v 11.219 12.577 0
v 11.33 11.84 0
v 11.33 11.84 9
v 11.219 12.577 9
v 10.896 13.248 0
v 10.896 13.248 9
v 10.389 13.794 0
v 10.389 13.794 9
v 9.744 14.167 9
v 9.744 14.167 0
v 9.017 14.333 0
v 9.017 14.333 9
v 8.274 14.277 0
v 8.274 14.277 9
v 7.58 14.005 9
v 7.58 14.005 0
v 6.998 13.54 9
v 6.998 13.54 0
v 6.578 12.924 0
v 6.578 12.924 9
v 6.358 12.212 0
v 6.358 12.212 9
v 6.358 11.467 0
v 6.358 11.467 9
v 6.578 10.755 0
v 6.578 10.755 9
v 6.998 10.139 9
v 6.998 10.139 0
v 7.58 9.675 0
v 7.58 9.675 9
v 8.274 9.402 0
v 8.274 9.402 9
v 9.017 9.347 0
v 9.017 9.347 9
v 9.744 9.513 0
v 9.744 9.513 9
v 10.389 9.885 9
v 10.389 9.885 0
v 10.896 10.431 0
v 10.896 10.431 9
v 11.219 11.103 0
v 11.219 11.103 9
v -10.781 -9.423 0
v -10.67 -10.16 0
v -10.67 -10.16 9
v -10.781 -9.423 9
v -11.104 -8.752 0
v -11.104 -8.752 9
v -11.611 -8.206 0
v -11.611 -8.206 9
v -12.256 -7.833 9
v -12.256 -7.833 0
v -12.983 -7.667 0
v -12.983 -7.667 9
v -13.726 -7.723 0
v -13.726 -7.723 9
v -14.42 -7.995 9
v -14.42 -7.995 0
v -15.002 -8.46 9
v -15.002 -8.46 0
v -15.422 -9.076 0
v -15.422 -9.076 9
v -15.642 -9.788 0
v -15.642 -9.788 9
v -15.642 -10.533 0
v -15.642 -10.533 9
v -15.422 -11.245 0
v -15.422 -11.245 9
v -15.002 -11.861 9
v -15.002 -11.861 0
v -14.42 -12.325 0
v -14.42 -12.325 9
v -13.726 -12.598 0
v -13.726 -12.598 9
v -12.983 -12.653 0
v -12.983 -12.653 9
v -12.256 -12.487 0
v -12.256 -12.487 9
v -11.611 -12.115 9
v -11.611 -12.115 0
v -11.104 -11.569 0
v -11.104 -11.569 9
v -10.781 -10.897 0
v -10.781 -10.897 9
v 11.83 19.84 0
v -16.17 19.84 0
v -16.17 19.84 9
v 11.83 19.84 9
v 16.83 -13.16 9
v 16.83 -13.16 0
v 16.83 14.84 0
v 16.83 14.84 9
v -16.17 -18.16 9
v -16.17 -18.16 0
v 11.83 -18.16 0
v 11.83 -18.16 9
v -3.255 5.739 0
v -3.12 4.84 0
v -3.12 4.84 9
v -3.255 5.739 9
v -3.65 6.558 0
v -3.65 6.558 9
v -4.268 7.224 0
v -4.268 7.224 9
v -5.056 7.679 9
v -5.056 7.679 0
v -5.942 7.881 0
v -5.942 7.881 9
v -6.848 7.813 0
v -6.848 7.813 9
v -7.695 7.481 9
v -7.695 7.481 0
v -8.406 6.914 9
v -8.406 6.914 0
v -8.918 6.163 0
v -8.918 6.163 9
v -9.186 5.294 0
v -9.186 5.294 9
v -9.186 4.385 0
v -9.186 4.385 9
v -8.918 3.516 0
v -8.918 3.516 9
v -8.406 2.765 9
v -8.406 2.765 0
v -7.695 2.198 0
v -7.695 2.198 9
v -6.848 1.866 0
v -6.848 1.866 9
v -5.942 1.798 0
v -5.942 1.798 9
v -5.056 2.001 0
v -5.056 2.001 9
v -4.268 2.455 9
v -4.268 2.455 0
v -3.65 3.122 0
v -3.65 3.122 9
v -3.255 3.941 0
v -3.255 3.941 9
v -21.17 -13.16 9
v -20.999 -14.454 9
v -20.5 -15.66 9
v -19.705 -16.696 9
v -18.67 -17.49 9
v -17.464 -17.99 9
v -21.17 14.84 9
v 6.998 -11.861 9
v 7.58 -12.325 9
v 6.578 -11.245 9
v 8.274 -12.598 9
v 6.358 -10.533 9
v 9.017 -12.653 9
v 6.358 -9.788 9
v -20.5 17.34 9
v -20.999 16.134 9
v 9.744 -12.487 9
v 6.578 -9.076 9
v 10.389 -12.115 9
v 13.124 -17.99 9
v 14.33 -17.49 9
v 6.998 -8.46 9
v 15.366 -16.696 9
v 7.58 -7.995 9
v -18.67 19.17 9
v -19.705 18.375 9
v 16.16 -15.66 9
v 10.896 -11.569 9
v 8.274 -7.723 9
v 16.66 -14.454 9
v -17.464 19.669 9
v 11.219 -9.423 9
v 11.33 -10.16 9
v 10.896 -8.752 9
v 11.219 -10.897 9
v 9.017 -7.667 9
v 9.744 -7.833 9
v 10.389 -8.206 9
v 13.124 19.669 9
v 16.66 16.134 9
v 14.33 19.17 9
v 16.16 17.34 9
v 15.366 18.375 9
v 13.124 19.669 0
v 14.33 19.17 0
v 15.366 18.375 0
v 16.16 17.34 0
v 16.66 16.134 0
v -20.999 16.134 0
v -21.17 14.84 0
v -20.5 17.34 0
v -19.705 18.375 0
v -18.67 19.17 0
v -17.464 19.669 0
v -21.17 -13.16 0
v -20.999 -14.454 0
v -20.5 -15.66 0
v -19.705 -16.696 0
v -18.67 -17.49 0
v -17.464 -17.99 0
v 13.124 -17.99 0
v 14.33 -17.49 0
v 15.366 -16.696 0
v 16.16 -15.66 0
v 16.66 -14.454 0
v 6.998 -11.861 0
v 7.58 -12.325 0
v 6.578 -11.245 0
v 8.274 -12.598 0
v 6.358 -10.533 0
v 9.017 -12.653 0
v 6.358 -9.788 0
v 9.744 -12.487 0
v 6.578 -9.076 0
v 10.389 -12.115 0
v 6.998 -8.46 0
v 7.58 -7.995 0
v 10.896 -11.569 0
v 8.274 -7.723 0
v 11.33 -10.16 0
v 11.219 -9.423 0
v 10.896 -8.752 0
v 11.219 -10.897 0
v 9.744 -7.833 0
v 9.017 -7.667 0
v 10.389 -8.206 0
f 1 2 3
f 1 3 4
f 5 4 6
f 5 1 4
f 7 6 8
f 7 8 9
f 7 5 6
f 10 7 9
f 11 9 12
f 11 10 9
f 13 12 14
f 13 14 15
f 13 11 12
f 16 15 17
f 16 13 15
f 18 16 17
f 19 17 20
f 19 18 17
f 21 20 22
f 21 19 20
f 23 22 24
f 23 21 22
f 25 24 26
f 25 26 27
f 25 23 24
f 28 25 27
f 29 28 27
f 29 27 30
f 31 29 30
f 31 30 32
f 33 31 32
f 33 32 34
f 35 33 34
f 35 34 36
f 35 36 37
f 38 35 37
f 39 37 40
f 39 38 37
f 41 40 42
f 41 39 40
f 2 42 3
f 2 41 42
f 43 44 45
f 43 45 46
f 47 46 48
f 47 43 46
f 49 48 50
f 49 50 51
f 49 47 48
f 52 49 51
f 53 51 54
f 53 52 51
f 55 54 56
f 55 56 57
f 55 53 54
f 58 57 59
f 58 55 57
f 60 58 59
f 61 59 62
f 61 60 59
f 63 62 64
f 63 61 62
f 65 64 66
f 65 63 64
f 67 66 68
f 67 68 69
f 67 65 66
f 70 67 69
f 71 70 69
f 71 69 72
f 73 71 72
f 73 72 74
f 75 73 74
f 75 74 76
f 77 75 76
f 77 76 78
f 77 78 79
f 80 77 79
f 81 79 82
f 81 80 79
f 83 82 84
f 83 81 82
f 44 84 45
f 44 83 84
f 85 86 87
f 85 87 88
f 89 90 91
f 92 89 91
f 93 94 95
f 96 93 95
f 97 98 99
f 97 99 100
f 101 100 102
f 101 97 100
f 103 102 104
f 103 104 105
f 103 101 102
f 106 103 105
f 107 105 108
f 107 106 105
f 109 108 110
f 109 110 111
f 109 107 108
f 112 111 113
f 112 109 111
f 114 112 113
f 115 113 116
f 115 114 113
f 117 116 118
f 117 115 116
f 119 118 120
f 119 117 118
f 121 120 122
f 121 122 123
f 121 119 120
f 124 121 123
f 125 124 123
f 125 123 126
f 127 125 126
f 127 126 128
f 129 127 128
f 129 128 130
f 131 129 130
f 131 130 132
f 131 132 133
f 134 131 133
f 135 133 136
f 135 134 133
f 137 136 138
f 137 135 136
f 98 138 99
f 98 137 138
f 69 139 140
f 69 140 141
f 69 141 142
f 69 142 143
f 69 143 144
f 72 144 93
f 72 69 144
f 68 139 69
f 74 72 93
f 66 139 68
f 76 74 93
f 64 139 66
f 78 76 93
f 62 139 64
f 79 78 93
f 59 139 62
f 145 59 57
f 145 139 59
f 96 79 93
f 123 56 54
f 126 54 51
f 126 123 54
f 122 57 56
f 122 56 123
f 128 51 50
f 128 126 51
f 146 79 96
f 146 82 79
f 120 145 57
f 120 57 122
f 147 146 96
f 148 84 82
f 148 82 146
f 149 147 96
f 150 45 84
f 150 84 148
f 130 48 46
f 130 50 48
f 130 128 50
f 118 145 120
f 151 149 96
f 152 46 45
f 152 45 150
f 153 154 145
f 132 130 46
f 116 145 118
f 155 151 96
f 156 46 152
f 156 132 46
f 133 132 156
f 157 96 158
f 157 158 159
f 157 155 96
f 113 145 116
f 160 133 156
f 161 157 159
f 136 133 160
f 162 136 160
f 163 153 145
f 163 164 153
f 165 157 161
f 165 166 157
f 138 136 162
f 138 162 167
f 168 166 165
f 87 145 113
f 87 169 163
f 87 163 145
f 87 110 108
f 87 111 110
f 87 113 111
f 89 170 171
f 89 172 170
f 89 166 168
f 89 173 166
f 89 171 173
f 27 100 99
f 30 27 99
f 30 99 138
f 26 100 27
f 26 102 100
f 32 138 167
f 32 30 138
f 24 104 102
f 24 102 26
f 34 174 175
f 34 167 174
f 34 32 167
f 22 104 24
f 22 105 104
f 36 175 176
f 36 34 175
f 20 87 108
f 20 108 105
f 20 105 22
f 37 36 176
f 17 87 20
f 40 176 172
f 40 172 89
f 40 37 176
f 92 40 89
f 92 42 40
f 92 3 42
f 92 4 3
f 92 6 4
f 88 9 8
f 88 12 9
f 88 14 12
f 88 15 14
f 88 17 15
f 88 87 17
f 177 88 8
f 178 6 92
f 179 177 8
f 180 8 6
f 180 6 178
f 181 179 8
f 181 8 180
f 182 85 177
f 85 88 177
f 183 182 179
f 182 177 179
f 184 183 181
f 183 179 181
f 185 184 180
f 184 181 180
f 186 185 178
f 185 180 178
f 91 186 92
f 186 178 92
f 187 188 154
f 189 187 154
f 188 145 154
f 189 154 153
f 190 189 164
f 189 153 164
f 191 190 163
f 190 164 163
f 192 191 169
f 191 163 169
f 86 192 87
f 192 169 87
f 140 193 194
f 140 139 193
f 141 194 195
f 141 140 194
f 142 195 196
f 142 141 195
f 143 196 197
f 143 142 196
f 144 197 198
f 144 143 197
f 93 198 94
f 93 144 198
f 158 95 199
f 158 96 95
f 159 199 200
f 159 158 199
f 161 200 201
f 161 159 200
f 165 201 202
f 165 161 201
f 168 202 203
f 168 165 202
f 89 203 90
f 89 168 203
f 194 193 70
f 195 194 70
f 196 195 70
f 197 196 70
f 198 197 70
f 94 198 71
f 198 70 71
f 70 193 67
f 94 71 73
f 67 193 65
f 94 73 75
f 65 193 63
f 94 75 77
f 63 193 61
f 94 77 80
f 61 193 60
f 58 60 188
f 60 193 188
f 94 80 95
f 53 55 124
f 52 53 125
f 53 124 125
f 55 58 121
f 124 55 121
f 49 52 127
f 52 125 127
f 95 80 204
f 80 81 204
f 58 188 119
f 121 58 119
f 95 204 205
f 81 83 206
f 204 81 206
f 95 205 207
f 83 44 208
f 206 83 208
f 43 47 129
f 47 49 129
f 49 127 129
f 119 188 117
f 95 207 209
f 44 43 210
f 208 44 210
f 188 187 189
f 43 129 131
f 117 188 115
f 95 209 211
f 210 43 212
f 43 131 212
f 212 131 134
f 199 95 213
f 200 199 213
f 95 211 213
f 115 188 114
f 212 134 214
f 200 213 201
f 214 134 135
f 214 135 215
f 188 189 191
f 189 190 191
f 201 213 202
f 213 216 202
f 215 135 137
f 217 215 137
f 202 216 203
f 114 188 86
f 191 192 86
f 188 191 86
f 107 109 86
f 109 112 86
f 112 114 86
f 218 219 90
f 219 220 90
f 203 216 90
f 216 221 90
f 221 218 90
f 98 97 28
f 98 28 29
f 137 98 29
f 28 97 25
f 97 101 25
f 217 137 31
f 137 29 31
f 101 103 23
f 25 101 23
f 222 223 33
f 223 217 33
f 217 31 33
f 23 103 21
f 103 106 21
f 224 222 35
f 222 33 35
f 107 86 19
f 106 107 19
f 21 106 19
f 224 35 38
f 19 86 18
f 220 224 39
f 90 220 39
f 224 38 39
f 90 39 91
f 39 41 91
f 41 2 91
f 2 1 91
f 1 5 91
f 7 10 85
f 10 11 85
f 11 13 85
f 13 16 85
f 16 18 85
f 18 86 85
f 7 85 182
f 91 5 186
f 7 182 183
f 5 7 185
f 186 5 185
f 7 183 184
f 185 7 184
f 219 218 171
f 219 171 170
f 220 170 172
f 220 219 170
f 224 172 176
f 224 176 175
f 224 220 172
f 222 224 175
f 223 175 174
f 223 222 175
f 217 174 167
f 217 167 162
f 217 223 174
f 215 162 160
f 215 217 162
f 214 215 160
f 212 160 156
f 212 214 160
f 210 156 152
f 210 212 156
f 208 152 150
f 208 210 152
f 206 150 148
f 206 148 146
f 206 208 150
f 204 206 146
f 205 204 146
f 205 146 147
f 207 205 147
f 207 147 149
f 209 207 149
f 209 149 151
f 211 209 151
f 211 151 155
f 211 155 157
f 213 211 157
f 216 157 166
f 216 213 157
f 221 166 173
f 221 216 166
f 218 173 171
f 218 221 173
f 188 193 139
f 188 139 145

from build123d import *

# Parameters (mm, degrees)
SKETCH_1_W      = 38
SKETCH_1_H      = 38
SKETCH_1_R      = 2.5
SKETCH_1_R_2    = 3.05
EXTRUDE_1_DEPTH = 9
FILLET_1_R      = 5


with BuildPart() as part:
    # 草图1 → 凸台-拉伸1 (new body)
    with BuildSketch(Plane.XY):
        with Locations((-2.169799589, 0.839779006)):
            Rectangle(SKETCH_1_W, SKETCH_1_H)
        with Locations((8.830200411, 11.839779006)):
            Circle(SKETCH_1_R, mode=Mode.SUBTRACT)
        with Locations((8.830200411, -10.160220994)):
            Circle(SKETCH_1_R, mode=Mode.SUBTRACT)
        with Locations((-13.169799589, -10.160220994)):
            Circle(SKETCH_1_R, mode=Mode.SUBTRACT)
        with Locations((-6.169799589, 4.839779006)):
            Circle(SKETCH_1_R_2, mode=Mode.SUBTRACT)
    extrude(amount=EXTRUDE_1_DEPTH)

    # 圆角1
    fillet_1_edges = [part.edges().sort_by_distance(p)[0] for p in [
        (-21.169799589, 19.839779006, 4.5),
        (16.830200411, 19.839779006, 4.5),
        (16.830200411, -18.160220994, 4.5),
        (-21.169799589, -18.160220994, 4.5),
    ]]
    fillet(fillet_1_edges, radius=FILLET_1_R)


solid = part.part
